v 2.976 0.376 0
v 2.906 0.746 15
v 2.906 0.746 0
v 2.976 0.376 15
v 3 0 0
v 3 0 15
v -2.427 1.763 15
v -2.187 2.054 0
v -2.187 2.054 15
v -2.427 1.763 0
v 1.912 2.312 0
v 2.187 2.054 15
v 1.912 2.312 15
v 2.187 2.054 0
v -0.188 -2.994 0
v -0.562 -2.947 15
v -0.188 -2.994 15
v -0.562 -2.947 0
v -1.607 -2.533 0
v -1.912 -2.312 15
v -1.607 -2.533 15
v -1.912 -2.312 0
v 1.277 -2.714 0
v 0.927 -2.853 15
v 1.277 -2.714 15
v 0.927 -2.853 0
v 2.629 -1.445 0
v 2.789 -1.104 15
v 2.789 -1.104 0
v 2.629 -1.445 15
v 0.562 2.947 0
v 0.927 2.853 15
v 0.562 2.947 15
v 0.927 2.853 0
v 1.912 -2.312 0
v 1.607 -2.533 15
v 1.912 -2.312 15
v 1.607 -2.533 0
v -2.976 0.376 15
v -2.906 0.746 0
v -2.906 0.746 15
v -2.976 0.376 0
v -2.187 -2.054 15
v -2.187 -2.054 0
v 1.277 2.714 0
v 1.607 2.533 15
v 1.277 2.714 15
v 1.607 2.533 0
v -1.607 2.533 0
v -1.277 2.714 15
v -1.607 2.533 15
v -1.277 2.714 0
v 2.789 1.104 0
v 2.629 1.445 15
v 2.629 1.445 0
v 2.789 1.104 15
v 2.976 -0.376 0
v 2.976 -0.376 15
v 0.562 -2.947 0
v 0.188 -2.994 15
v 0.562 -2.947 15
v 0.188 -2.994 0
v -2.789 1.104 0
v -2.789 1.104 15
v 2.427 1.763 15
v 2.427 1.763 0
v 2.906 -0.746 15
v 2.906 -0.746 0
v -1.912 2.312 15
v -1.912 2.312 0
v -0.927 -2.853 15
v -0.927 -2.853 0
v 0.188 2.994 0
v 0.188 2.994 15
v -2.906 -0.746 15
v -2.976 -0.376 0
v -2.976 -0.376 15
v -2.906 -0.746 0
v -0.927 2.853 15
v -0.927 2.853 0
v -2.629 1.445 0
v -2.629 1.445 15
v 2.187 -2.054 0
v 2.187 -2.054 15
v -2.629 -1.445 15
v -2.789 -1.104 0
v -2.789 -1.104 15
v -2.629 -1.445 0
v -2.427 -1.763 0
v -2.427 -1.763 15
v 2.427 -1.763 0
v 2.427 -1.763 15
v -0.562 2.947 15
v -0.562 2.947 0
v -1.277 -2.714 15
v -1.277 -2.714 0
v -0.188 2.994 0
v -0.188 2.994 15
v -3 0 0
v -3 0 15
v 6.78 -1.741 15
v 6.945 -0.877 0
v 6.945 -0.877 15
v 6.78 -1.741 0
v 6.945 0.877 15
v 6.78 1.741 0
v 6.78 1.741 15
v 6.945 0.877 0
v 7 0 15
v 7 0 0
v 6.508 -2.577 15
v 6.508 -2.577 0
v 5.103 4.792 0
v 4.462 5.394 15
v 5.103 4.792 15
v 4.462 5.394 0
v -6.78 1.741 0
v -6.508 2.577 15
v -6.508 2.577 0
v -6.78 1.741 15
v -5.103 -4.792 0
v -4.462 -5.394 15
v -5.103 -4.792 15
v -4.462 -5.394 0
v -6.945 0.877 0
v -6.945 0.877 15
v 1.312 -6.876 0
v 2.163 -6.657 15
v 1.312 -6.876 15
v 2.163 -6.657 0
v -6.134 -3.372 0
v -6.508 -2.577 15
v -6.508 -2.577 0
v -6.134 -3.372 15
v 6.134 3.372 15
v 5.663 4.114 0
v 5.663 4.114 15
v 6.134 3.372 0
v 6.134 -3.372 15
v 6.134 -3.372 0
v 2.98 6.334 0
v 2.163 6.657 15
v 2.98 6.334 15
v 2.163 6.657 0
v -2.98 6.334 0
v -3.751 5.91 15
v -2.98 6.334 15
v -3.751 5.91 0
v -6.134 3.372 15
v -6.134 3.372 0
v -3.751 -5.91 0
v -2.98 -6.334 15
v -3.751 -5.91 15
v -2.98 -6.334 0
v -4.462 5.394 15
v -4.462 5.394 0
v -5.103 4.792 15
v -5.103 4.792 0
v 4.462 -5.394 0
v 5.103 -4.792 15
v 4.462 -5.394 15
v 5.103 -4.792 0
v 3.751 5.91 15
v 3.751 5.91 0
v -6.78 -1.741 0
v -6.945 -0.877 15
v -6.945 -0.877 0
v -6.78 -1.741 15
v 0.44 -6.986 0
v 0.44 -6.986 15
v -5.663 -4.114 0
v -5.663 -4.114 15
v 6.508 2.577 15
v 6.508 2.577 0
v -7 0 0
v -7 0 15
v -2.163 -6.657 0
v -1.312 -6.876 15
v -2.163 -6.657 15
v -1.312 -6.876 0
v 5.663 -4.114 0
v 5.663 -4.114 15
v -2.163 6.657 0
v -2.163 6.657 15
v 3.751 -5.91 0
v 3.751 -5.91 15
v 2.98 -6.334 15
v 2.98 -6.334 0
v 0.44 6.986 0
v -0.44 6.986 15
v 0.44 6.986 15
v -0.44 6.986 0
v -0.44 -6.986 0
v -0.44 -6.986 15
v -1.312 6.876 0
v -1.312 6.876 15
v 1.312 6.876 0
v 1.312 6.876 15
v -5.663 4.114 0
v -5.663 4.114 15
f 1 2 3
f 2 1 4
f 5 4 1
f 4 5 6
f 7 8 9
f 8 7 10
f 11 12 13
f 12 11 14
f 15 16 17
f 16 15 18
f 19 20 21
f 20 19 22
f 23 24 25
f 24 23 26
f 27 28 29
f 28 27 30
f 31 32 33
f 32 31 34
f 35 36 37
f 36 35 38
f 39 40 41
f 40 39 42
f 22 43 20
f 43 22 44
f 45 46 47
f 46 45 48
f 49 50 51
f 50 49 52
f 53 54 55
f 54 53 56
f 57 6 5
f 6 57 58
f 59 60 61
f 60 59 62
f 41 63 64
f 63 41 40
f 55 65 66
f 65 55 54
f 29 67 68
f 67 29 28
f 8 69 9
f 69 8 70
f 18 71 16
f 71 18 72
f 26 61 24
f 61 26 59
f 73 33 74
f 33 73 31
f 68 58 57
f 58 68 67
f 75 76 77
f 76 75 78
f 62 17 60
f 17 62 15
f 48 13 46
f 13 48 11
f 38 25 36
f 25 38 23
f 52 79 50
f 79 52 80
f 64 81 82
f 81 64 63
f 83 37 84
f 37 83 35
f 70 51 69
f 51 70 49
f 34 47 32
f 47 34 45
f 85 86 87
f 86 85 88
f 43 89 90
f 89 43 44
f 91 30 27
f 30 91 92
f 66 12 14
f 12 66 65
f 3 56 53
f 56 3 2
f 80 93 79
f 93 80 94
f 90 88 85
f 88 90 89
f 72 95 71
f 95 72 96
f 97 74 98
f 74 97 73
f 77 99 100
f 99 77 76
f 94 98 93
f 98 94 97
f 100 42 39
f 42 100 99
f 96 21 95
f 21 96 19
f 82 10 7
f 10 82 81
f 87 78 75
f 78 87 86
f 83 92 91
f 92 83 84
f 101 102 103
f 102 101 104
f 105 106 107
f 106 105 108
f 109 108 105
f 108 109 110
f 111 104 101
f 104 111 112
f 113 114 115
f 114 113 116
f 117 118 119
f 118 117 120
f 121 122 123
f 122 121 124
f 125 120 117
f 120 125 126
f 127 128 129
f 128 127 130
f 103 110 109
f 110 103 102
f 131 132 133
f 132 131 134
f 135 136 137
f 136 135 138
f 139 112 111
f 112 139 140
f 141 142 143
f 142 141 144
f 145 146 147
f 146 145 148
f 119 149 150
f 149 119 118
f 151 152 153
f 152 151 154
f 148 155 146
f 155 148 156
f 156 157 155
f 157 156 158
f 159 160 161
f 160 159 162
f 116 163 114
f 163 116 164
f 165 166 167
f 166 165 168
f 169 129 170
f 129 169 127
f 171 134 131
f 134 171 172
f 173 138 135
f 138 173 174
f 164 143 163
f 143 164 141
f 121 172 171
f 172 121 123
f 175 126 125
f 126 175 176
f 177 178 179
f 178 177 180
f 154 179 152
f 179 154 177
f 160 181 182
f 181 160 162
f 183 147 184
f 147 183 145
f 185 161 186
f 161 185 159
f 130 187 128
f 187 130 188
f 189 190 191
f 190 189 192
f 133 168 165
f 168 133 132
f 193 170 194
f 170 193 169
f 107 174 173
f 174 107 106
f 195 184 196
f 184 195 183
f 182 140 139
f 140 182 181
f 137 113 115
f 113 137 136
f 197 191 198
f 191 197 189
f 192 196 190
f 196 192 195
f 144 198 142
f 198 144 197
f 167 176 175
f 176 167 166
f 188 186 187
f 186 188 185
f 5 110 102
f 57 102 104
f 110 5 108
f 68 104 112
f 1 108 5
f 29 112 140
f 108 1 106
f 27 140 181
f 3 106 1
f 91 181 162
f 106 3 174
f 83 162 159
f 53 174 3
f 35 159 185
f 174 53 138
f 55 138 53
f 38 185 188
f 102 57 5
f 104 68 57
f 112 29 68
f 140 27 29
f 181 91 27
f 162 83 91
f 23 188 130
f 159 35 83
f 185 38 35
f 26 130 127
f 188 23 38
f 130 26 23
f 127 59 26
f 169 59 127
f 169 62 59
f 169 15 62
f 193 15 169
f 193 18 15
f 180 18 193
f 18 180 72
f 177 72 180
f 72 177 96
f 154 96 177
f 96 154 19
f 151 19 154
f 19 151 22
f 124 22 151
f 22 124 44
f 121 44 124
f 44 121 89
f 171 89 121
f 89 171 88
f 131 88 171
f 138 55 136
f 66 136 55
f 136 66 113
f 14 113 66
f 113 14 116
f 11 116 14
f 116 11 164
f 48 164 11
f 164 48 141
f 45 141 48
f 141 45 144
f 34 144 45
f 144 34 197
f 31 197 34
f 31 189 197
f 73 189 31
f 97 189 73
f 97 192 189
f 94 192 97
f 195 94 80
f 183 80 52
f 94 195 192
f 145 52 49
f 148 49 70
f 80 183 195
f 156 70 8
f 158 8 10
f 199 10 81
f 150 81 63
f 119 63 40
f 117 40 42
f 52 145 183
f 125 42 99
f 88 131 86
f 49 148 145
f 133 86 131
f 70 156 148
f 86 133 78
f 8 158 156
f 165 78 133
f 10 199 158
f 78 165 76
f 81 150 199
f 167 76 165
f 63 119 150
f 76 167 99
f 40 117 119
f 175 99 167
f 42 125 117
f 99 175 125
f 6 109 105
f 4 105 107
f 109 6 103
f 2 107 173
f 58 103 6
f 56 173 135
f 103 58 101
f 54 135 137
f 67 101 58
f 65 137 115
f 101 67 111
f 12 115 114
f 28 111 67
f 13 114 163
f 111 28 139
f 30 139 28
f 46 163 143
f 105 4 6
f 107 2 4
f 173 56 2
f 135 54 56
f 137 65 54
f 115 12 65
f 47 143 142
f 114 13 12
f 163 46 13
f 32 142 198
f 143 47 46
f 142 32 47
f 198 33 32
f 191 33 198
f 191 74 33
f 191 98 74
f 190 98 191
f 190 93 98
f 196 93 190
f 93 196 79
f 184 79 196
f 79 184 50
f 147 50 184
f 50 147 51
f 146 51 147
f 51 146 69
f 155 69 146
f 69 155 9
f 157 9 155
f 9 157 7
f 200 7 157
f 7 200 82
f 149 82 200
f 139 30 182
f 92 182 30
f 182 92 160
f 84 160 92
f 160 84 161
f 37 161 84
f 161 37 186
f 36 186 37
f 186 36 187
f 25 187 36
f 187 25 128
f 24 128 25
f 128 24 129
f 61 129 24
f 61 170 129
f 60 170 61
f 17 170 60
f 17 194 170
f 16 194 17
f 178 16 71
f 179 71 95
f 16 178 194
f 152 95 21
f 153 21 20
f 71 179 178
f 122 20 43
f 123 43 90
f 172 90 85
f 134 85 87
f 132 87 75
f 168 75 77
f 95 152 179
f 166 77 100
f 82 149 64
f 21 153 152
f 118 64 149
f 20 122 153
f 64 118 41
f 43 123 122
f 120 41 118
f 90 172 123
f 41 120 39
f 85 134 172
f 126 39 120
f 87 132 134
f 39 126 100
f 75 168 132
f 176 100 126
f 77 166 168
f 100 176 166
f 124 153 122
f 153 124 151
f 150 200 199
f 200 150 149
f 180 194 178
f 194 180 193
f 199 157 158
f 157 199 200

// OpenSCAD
$fn = 50;


difference() {
	union() {
		cylinder(h = 15, r = 7.0000000000);
	}
	union() {
		translate(v = [0.0000000000, 0.0000000000, -100.0000000000]) {
			cylinder(h = 200, r = 3.0000000000);
		}
		translate(v = [0.0000000000, 0.0000000000, -100.0000000000]) {
			cylinder(h = 200, r = 3.0000000000);
		}
		translate(v = [0.0000000000, 0.0000000000, -100.0000000000]) {
			cylinder(h = 200, r = 3.0000000000);
		}
		translate(v = [0.0000000000, 0.0000000000, -100.0000000000]) {
			cylinder(h = 200, r = 3.0000000000);
		}
	}
}
